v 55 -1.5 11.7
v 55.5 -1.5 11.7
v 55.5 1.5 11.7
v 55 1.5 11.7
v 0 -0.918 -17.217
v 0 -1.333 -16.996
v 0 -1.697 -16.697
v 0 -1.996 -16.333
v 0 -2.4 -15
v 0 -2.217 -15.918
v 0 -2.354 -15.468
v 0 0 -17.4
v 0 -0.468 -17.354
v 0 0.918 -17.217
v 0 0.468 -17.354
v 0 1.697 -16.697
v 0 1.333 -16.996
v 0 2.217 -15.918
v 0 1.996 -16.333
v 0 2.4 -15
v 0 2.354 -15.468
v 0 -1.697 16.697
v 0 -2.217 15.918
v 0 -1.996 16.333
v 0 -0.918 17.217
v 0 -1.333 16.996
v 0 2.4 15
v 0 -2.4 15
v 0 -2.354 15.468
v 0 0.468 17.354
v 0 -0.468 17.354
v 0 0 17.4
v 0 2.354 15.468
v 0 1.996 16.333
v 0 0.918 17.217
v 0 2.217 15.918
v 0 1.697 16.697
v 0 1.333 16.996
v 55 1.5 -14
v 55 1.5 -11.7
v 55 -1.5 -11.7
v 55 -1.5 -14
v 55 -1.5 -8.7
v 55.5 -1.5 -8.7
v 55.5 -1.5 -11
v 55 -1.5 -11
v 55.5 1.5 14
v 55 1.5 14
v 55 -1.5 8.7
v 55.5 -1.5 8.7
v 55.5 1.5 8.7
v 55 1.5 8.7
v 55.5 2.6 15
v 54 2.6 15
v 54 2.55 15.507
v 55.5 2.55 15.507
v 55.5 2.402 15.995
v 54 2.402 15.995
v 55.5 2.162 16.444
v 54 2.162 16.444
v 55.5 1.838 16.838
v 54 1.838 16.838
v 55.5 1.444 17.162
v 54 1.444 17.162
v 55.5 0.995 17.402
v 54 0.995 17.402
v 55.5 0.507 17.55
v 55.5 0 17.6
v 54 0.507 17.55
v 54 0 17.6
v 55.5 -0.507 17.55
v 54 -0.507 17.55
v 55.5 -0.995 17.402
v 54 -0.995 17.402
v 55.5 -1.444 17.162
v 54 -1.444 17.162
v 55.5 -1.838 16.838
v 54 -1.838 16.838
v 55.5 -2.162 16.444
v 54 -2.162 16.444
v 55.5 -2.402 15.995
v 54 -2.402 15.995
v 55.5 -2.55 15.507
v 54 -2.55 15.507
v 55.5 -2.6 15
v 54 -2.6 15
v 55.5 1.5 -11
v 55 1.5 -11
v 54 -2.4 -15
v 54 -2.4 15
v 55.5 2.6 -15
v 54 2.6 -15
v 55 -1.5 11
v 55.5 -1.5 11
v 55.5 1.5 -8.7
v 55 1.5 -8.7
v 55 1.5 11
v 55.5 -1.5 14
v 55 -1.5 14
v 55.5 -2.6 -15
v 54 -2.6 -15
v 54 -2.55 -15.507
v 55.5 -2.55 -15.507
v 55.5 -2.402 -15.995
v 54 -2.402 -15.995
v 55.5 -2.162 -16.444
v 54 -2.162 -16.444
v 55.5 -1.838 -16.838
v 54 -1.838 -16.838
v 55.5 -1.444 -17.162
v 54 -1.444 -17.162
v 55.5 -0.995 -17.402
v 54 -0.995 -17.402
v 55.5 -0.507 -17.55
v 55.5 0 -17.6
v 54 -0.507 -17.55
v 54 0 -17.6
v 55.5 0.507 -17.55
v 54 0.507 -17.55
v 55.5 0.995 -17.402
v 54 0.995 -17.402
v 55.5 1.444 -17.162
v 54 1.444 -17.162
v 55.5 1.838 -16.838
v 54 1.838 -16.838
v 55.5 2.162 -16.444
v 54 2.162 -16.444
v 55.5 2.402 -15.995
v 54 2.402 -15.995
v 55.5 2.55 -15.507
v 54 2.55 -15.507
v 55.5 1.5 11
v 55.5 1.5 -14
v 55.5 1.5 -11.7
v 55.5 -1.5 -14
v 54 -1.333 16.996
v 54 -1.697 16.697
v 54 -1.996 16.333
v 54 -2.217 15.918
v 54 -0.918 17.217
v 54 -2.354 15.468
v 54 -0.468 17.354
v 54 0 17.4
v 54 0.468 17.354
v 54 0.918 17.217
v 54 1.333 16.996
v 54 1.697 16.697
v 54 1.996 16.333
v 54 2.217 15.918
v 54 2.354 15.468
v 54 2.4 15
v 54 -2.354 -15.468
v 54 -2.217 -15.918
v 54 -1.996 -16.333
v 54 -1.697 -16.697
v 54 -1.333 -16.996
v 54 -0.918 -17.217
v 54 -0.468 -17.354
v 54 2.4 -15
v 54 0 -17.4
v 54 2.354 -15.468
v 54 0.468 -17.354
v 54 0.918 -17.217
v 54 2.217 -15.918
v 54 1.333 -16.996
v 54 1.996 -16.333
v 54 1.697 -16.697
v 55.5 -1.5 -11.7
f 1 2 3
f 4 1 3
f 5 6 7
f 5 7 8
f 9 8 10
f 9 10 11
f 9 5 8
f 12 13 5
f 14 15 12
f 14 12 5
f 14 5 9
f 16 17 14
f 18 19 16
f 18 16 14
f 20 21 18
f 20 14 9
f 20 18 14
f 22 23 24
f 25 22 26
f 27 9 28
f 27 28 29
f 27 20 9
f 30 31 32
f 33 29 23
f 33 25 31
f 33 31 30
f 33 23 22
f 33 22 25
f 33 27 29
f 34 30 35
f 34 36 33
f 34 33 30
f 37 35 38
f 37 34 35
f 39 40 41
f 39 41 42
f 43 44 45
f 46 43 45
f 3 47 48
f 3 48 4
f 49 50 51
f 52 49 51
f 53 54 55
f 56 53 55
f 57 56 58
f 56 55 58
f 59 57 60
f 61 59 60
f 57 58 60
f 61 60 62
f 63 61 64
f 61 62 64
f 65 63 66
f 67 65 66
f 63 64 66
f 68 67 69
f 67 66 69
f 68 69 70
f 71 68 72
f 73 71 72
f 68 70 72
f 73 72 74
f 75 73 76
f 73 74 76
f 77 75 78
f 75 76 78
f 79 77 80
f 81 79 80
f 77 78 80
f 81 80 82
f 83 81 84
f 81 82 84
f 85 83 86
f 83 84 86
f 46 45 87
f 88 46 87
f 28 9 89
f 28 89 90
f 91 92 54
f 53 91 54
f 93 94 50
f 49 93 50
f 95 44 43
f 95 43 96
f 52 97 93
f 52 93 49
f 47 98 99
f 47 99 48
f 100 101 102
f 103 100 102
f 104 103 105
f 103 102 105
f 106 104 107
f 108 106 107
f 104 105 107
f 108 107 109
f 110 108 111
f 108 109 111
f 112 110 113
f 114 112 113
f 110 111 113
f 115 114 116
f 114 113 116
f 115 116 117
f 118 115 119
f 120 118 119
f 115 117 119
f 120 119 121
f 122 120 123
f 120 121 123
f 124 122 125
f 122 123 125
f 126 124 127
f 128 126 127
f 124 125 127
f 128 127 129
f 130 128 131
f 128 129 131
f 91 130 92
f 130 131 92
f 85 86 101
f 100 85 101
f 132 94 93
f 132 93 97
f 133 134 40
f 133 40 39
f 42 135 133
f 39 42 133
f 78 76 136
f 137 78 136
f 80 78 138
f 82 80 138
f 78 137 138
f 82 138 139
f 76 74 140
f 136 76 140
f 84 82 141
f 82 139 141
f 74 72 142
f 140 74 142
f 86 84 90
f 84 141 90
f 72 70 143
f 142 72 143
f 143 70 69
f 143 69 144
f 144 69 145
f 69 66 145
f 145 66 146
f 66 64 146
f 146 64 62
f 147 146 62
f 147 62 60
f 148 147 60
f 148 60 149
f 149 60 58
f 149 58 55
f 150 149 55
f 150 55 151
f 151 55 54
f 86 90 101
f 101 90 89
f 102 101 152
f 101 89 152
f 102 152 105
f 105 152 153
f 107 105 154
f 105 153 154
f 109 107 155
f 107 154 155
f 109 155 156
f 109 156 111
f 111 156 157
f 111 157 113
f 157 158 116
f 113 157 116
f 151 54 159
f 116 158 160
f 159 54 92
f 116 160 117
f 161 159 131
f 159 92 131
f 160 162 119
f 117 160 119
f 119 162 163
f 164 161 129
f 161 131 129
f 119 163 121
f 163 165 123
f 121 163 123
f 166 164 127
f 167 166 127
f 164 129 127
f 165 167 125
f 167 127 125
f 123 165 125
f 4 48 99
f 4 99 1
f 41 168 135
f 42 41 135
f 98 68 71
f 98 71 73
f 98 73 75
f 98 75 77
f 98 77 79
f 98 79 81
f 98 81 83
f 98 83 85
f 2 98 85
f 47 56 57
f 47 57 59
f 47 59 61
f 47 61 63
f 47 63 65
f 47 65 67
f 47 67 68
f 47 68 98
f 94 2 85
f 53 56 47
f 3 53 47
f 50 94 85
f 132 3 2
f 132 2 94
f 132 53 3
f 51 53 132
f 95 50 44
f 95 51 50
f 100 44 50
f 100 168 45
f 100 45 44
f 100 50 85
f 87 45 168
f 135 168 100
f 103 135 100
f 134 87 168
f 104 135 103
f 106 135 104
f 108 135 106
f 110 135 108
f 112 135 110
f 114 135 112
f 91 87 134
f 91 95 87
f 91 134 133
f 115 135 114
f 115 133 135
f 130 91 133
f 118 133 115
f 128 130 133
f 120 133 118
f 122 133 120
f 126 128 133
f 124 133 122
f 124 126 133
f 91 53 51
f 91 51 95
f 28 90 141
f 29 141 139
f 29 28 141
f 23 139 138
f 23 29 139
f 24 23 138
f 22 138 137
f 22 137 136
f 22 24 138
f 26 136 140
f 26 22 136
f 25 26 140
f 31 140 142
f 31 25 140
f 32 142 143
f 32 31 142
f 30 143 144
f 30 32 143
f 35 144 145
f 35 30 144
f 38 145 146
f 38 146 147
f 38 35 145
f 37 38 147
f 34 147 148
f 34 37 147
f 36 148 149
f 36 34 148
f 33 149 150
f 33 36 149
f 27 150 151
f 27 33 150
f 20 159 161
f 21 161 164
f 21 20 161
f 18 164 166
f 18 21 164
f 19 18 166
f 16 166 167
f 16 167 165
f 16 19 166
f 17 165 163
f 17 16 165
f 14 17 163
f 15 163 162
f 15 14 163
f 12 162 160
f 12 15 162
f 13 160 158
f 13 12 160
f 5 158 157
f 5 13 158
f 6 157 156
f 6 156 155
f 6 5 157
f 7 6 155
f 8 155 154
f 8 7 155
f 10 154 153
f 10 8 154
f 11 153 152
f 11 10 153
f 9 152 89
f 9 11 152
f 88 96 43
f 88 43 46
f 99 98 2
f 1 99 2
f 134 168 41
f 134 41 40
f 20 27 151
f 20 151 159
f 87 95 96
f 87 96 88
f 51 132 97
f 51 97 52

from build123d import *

# Parameters (mm, degrees)
BOSS_EXTRUDE1_DEPTH = 54
BOSS_EXTRUDE2_DEPTH = 1.5
SKETCH3_W           = 2.3
SKETCH3_H           = 3
CUT_EXTRUDE1_DEPTH  = 0.5


with BuildPart() as part:
    # Sketch1 → Boss-Extrude1 (new body)
    with BuildSketch(Plane(origin=(0, 0, 0), x_dir=(0, 0, -1), z_dir=(1, 0, 0))):
        with BuildLine():
            Line((-15, 2.4), (15, 2.4))
            ThreePointArc((15, 2.4), (17.4, 0), (15, -2.4))
            Line((15, -2.4), (-15, -2.4))
            ThreePointArc((-15, -2.4), (-17.4, 0), (-15, 2.4))
        make_face()
    extrude(amount=BOSS_EXTRUDE1_DEPTH)

    # Sketch2 → Boss-Extrude2 (add)
    with BuildSketch(Plane(origin=(54, 0, 0), x_dir=(0, 0, -1), z_dir=(1, 0, 0))):
        with BuildLine():
            Line((-15, -2.6), (15, -2.6))
            ThreePointArc((15, -2.6), (17.6, 0), (15, 2.6))
            Line((15, 2.6), (-15, 2.6))
            ThreePointArc((-15, 2.6), (-17.6, 0), (-15, -2.6))
        make_face()
    extrude(amount=BOSS_EXTRUDE2_DEPTH)

    # Sketch3 → Cut-Extrude1 (cut)
    with BuildSketch(Plane(origin=(55.5, 0, 0), x_dir=(0, 0, -1), z_dir=(1, 0, 0))):
        with Locations((-12.85, 0)):
            Rectangle(SKETCH3_W, SKETCH3_H)
        with Locations((-9.85, 0)):
            Rectangle(SKETCH3_W, SKETCH3_H)
        with Locations((9.85, 0)):
            Rectangle(SKETCH3_W, SKETCH3_H)
        with Locations((12.85, 0)):
            Rectangle(SKETCH3_W, SKETCH3_H)
    extrude(amount=-CUT_EXTRUDE1_DEPTH, mode=Mode.SUBTRACT)


solid = part.part
